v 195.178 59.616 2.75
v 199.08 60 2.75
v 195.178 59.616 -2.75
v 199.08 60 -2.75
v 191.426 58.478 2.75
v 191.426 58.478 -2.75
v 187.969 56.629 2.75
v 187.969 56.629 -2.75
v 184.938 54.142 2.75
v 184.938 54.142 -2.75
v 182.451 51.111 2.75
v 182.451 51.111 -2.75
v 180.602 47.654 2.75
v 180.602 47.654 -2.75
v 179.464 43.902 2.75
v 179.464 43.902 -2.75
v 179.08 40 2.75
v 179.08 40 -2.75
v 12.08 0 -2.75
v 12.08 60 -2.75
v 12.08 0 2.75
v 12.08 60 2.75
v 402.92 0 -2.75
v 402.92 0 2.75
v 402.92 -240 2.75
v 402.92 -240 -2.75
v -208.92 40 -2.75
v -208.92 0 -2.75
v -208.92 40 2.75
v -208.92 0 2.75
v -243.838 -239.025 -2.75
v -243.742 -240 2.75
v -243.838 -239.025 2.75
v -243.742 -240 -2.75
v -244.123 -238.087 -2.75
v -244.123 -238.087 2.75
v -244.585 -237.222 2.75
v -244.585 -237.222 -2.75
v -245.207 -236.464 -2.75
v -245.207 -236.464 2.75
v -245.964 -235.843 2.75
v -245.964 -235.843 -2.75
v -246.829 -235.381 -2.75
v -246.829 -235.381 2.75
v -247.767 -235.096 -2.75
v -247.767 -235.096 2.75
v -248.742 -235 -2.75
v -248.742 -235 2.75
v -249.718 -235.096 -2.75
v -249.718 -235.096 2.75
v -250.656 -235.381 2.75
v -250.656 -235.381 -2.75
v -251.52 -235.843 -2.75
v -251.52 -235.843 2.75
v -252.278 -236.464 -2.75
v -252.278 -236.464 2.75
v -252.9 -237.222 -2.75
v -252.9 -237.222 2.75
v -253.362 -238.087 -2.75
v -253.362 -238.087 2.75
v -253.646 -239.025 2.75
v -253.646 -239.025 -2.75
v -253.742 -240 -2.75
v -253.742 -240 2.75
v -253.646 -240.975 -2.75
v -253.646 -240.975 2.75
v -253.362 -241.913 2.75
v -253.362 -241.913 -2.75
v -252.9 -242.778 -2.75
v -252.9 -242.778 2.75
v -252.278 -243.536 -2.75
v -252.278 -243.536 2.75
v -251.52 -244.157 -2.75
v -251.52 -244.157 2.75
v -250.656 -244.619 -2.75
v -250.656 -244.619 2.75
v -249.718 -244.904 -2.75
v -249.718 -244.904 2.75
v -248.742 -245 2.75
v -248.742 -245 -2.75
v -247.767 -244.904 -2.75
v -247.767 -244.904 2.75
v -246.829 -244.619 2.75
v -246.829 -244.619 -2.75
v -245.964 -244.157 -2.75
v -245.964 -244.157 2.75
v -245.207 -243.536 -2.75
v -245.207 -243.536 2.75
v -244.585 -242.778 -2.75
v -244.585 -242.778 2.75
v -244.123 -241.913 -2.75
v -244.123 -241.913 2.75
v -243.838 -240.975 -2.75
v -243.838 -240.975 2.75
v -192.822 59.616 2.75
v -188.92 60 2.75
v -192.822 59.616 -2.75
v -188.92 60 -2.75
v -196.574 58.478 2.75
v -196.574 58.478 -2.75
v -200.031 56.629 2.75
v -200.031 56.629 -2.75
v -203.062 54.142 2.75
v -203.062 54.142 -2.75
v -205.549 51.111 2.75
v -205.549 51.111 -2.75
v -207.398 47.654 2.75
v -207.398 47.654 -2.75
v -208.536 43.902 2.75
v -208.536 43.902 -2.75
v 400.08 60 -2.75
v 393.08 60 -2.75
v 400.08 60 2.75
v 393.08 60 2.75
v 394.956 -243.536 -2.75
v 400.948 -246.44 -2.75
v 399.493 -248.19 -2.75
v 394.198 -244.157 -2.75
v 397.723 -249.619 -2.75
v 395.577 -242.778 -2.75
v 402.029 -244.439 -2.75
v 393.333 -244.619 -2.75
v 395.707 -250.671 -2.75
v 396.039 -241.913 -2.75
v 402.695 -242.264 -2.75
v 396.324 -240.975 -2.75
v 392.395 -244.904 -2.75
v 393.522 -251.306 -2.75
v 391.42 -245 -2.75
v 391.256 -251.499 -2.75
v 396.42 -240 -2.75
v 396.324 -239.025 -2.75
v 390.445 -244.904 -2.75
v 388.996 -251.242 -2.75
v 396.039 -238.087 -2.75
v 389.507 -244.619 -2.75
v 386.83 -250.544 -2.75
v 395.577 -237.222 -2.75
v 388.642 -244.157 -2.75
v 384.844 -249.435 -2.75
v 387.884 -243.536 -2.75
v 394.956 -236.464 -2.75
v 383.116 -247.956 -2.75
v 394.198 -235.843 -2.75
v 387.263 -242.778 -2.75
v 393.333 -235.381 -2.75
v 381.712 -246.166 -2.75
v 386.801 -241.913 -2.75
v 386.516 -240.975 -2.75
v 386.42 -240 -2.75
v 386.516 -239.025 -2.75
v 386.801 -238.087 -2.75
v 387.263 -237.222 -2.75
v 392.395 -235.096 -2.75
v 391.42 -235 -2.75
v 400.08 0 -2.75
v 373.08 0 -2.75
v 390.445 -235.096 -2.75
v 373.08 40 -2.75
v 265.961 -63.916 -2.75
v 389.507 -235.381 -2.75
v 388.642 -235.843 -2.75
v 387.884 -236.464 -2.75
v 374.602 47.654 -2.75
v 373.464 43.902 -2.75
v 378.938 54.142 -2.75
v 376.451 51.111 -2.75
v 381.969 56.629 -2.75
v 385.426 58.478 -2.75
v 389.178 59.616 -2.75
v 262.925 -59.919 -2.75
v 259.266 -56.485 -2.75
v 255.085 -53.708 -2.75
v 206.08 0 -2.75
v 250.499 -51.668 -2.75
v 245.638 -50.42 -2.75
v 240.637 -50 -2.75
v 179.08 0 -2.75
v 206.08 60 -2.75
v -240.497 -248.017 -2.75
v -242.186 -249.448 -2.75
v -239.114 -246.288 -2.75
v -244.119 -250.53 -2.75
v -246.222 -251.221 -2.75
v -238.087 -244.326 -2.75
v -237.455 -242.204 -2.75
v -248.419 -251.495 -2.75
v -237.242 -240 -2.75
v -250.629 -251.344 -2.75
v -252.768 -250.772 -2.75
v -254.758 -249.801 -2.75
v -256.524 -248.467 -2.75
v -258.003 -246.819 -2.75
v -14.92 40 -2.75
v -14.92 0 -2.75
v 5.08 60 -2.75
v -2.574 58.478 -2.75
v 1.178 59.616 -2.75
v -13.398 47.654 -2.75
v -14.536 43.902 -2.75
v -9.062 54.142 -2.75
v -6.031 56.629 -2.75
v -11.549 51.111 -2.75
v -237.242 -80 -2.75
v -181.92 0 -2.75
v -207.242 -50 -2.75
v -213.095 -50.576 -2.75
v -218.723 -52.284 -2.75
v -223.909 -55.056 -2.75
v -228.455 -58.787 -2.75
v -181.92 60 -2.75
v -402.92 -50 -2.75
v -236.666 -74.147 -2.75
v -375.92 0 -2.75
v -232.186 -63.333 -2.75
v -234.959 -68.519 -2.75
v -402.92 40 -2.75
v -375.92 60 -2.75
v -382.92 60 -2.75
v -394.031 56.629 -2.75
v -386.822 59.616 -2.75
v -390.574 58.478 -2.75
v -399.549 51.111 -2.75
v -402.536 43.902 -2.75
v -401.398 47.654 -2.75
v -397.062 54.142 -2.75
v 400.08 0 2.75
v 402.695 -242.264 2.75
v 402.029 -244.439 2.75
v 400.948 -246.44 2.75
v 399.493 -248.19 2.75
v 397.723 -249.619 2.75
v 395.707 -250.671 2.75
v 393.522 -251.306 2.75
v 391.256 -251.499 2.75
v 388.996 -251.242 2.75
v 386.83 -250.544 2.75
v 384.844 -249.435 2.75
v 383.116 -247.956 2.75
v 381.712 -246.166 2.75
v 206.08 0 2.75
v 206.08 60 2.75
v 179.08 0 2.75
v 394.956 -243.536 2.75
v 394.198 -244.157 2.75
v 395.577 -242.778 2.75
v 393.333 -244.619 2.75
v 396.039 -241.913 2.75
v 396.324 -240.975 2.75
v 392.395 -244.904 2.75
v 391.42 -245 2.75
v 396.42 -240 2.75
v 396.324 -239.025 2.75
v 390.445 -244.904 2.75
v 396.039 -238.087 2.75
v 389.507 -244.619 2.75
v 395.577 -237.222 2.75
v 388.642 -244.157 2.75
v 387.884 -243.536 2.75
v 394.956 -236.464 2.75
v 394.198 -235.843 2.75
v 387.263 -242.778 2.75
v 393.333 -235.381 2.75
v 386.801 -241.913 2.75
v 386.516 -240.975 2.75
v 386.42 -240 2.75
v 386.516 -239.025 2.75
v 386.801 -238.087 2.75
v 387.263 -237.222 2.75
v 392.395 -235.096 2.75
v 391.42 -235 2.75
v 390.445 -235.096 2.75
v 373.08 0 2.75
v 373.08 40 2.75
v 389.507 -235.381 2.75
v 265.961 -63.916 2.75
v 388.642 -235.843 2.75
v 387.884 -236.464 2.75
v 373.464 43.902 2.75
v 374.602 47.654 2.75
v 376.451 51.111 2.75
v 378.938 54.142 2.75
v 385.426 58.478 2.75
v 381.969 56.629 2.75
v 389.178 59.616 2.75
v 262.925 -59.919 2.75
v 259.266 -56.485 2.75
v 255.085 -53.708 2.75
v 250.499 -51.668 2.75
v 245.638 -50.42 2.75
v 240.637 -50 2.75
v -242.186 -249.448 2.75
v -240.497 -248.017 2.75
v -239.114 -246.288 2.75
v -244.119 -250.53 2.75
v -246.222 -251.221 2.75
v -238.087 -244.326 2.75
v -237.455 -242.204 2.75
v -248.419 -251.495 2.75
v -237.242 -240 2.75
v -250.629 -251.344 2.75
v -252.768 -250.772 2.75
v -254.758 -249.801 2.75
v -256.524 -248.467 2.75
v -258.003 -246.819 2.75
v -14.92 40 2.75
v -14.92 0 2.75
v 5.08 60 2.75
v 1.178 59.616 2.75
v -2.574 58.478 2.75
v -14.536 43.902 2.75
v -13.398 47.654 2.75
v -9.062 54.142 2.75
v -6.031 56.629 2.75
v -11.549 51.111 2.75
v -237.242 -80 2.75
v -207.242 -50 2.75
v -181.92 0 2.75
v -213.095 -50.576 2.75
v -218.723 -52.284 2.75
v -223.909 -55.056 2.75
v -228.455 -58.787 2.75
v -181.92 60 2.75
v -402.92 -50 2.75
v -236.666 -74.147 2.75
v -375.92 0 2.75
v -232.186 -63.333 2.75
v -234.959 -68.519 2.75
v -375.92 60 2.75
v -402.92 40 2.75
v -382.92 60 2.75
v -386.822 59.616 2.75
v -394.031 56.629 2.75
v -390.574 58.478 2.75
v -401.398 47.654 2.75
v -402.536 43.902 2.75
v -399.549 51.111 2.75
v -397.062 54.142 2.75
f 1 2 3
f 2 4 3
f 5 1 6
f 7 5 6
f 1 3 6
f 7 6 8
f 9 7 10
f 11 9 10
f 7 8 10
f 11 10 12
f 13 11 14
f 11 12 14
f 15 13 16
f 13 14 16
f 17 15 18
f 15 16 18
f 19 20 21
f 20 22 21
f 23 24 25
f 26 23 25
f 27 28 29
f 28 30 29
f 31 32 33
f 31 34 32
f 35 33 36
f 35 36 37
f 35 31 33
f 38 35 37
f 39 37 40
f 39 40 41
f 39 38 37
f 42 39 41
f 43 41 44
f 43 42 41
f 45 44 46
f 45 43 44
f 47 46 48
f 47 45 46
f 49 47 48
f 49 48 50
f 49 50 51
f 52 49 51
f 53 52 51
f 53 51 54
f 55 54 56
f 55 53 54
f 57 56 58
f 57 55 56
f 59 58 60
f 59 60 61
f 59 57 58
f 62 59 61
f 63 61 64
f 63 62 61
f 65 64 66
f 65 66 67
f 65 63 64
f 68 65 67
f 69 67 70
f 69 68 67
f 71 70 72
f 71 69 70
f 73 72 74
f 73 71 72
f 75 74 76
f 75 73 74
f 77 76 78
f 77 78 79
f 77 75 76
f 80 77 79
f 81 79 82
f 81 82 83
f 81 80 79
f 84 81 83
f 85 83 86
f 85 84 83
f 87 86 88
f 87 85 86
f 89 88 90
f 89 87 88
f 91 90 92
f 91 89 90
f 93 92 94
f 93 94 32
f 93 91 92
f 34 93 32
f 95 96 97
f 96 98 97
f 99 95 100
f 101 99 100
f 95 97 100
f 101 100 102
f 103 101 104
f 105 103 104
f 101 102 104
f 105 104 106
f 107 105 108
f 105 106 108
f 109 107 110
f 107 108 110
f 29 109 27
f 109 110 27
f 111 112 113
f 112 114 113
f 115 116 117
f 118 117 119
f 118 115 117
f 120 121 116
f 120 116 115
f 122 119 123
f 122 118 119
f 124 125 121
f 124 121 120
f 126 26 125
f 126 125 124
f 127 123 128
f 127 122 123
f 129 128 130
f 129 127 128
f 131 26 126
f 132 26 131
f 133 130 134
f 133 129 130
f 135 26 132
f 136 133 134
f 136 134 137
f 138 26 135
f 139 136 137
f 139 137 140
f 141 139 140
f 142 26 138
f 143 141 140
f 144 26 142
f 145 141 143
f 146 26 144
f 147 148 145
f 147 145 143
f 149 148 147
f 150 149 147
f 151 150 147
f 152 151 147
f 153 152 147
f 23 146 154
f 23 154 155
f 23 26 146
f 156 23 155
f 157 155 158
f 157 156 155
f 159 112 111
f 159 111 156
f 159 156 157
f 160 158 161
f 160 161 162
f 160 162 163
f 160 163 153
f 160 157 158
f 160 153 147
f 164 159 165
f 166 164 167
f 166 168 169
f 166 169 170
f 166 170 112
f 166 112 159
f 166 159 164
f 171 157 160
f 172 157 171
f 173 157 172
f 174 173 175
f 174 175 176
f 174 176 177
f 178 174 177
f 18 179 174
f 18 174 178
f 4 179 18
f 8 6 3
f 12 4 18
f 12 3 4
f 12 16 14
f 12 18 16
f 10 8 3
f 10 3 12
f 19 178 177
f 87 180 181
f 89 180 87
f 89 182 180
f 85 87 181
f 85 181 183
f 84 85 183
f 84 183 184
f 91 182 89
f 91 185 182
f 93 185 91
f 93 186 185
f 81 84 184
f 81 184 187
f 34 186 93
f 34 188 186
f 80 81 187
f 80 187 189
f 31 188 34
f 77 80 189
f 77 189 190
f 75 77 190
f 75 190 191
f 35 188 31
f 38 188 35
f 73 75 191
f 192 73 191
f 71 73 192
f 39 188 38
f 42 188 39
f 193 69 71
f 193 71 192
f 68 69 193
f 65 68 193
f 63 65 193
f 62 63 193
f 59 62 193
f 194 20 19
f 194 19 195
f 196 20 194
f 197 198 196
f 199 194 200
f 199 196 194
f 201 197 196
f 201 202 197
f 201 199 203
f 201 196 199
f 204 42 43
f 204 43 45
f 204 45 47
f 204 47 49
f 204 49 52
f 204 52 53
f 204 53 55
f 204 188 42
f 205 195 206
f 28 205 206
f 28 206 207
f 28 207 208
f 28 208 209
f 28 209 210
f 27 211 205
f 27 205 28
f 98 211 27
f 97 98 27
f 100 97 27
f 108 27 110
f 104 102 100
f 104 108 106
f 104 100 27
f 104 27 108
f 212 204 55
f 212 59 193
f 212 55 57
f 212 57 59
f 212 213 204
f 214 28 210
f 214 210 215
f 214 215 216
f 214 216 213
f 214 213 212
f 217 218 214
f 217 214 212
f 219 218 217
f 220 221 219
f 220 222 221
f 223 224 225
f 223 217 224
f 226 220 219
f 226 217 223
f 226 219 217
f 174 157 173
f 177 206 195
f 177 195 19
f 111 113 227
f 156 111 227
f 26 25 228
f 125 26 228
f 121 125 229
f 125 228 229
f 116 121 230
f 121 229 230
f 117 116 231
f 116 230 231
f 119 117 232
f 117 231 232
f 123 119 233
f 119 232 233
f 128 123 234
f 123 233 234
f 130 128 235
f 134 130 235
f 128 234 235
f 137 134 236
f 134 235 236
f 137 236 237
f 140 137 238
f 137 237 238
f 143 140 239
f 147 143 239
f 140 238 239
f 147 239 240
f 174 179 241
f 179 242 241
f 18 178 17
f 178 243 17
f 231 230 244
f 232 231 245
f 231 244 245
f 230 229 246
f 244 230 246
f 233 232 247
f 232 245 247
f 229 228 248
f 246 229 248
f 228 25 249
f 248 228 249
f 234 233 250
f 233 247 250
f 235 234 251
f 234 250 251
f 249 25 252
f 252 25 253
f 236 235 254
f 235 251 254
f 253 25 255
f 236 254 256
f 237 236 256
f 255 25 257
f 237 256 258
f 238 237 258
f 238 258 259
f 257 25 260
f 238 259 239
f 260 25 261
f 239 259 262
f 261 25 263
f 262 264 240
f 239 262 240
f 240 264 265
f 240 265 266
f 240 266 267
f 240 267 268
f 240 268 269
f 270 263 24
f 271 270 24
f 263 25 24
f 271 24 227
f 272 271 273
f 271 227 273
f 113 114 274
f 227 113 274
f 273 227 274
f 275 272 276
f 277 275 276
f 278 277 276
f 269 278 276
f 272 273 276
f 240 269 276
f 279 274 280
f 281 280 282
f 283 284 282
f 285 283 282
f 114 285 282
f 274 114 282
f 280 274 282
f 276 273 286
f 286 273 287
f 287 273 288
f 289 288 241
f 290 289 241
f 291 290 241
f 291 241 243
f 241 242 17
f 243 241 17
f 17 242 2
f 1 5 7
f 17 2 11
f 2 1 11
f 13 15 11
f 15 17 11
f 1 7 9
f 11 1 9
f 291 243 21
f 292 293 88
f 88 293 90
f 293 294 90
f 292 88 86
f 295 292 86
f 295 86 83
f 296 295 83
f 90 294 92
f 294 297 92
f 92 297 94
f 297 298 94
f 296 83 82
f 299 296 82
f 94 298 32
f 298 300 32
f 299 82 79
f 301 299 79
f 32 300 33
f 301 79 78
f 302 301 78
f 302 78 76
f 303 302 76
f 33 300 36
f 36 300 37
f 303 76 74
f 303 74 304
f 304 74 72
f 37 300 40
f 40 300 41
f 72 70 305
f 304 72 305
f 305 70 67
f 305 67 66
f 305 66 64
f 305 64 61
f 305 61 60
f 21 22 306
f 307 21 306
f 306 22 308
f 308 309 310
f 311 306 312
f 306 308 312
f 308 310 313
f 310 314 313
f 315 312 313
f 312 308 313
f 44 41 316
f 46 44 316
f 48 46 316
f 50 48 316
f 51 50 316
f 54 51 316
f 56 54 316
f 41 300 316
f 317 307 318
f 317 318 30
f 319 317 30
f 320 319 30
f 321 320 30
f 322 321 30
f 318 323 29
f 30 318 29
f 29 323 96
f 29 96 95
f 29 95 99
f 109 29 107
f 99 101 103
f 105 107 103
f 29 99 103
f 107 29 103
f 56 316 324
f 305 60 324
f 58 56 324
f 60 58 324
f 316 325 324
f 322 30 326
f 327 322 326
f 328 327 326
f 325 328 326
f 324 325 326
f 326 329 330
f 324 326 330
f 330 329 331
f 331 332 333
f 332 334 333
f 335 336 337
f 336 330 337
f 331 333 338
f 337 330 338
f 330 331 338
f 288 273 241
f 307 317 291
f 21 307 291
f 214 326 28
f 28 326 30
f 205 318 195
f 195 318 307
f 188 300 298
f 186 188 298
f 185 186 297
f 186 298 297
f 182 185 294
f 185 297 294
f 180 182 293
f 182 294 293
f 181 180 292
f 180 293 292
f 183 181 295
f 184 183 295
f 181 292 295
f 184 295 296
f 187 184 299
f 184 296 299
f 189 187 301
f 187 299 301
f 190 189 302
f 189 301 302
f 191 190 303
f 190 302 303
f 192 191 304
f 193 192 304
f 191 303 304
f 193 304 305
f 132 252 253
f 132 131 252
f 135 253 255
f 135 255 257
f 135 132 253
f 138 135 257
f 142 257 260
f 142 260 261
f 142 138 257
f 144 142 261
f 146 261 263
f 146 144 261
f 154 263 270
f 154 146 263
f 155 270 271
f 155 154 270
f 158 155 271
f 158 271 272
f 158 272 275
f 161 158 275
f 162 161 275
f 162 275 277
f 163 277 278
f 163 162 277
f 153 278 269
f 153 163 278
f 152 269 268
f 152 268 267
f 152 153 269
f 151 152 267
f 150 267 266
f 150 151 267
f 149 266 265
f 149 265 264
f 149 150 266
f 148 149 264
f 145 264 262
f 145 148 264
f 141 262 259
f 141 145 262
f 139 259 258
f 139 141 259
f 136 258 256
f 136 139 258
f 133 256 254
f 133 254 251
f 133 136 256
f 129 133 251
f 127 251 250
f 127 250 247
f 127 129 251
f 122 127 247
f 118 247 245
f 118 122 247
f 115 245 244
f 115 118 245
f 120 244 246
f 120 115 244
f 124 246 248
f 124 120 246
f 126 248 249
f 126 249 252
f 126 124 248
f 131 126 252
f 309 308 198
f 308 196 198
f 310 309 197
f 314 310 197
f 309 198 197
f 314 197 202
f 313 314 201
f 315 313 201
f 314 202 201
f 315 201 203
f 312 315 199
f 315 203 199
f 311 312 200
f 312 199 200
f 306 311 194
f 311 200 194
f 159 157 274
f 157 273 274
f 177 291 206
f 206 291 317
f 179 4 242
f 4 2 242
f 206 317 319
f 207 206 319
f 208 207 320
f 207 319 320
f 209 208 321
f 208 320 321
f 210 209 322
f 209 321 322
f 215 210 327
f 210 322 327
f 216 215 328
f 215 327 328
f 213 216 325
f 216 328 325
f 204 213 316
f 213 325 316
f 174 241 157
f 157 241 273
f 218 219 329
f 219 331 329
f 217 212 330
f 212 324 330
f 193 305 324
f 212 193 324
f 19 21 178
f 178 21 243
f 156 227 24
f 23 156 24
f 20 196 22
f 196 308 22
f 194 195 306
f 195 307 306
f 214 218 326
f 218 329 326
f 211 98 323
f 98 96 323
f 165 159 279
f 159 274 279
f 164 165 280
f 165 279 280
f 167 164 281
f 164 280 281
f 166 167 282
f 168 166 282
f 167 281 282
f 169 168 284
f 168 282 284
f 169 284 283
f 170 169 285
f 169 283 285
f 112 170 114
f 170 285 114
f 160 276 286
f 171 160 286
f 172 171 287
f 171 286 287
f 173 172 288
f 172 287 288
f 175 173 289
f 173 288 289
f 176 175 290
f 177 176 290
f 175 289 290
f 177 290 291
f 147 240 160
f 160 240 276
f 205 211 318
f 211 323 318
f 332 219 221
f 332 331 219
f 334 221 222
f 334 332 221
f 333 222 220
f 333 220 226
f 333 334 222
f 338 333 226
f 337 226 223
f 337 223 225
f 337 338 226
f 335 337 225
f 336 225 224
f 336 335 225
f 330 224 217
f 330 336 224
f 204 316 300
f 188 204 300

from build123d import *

# Parameters (mm, degrees)
SKETCH1_R           = 5
BOSS_EXTRUDE1_DEPTH = 2.75
FILLET1_R           = 20


with BuildPart() as part:
    # Sketch1 → Boss-Extrude1 (new body, symmetric)
    with BuildSketch(Plane.XY):
        with BuildLine():
            Line((-402.92, 0), (-402.92, 60))
            Line((-402.92, 60), (-375.92, 60))
            Line((-375.92, 60), (-375.92, 0))
            Line((-375.92, 0), (-208.92, 0))
            Line((-208.92, 0), (-208.92, 60))
            Line((-208.92, 60), (-181.92, 60))
            Line((-181.92, 60), (-181.92, 0))
            Line((-181.92, 0), (-14.92, 0))
            Line((-14.92, 0), (-14.92, 60))
            Line((-14.92, 60), (12.08, 60))
            Line((12.08, 60), (12.08, 0))
            Line((12.08, 0), (179.08, 0))
            Line((179.08, 0), (179.08, 60))
            Line((179.08, 60), (206.08, 60))
            Line((206.08, 60), (206.08, 0))
            Line((206.08, 0), (373.08, 0))
            Line((373.08, 0), (373.08, 60))
            Line((373.08, 60), (400.08, 60))
            Line((400.08, 60), (400.08, 0))
            Line((400.08, 0), (402.92, 0))
            Line((402.92, 0), (402.92, -240))
            ThreePointArc((402.92, -240), (394.630398166, -251.042796005), (381.71246198, -246.165525573))
            Line((381.71246198, -246.165525573), (265.960766405, -63.916020245))
            ThreePointArc((265.960766405, -63.916020245), (255.084601896, -53.708181951), (240.636754178, -50))
            Line((240.636754178, -50), (-207.242294627, -50))
            ThreePointArc((-207.242294627, -50), (-228.455498062, -58.786796564), (-237.242294627, -80))
            Line((-237.242294627, -80), (-237.242294627, -240))
            ThreePointArc((-237.242294627, -240), (-245.153860516, -250.925801601), (-258.002840824, -246.81852507))
            Line((-258.002840824, -246.81852507), (-402.92, -50))
            Line((-402.92, -50), (-402.92, 0))
        make_face()
        with Locations((-248.742294627, -240)):
            Circle(SKETCH1_R, mode=Mode.SUBTRACT)
        with Locations((391.42, -240)):
            Circle(SKETCH1_R, mode=Mode.SUBTRACT)
    extrude(amount=BOSS_EXTRUDE1_DEPTH, both=True)

    # Fillet1
    fillet1_edges = [part.edges().sort_by_distance(p)[0] for p in [
        (-402.92, 60, 0),
        (-208.92, 60, 0),
        (-14.92, 60, 0),
        (179.08, 60, 0),
        (373.08, 60, 0),
    ]]
    fillet(fillet1_edges, radius=FILLET1_R)


solid = part.part
